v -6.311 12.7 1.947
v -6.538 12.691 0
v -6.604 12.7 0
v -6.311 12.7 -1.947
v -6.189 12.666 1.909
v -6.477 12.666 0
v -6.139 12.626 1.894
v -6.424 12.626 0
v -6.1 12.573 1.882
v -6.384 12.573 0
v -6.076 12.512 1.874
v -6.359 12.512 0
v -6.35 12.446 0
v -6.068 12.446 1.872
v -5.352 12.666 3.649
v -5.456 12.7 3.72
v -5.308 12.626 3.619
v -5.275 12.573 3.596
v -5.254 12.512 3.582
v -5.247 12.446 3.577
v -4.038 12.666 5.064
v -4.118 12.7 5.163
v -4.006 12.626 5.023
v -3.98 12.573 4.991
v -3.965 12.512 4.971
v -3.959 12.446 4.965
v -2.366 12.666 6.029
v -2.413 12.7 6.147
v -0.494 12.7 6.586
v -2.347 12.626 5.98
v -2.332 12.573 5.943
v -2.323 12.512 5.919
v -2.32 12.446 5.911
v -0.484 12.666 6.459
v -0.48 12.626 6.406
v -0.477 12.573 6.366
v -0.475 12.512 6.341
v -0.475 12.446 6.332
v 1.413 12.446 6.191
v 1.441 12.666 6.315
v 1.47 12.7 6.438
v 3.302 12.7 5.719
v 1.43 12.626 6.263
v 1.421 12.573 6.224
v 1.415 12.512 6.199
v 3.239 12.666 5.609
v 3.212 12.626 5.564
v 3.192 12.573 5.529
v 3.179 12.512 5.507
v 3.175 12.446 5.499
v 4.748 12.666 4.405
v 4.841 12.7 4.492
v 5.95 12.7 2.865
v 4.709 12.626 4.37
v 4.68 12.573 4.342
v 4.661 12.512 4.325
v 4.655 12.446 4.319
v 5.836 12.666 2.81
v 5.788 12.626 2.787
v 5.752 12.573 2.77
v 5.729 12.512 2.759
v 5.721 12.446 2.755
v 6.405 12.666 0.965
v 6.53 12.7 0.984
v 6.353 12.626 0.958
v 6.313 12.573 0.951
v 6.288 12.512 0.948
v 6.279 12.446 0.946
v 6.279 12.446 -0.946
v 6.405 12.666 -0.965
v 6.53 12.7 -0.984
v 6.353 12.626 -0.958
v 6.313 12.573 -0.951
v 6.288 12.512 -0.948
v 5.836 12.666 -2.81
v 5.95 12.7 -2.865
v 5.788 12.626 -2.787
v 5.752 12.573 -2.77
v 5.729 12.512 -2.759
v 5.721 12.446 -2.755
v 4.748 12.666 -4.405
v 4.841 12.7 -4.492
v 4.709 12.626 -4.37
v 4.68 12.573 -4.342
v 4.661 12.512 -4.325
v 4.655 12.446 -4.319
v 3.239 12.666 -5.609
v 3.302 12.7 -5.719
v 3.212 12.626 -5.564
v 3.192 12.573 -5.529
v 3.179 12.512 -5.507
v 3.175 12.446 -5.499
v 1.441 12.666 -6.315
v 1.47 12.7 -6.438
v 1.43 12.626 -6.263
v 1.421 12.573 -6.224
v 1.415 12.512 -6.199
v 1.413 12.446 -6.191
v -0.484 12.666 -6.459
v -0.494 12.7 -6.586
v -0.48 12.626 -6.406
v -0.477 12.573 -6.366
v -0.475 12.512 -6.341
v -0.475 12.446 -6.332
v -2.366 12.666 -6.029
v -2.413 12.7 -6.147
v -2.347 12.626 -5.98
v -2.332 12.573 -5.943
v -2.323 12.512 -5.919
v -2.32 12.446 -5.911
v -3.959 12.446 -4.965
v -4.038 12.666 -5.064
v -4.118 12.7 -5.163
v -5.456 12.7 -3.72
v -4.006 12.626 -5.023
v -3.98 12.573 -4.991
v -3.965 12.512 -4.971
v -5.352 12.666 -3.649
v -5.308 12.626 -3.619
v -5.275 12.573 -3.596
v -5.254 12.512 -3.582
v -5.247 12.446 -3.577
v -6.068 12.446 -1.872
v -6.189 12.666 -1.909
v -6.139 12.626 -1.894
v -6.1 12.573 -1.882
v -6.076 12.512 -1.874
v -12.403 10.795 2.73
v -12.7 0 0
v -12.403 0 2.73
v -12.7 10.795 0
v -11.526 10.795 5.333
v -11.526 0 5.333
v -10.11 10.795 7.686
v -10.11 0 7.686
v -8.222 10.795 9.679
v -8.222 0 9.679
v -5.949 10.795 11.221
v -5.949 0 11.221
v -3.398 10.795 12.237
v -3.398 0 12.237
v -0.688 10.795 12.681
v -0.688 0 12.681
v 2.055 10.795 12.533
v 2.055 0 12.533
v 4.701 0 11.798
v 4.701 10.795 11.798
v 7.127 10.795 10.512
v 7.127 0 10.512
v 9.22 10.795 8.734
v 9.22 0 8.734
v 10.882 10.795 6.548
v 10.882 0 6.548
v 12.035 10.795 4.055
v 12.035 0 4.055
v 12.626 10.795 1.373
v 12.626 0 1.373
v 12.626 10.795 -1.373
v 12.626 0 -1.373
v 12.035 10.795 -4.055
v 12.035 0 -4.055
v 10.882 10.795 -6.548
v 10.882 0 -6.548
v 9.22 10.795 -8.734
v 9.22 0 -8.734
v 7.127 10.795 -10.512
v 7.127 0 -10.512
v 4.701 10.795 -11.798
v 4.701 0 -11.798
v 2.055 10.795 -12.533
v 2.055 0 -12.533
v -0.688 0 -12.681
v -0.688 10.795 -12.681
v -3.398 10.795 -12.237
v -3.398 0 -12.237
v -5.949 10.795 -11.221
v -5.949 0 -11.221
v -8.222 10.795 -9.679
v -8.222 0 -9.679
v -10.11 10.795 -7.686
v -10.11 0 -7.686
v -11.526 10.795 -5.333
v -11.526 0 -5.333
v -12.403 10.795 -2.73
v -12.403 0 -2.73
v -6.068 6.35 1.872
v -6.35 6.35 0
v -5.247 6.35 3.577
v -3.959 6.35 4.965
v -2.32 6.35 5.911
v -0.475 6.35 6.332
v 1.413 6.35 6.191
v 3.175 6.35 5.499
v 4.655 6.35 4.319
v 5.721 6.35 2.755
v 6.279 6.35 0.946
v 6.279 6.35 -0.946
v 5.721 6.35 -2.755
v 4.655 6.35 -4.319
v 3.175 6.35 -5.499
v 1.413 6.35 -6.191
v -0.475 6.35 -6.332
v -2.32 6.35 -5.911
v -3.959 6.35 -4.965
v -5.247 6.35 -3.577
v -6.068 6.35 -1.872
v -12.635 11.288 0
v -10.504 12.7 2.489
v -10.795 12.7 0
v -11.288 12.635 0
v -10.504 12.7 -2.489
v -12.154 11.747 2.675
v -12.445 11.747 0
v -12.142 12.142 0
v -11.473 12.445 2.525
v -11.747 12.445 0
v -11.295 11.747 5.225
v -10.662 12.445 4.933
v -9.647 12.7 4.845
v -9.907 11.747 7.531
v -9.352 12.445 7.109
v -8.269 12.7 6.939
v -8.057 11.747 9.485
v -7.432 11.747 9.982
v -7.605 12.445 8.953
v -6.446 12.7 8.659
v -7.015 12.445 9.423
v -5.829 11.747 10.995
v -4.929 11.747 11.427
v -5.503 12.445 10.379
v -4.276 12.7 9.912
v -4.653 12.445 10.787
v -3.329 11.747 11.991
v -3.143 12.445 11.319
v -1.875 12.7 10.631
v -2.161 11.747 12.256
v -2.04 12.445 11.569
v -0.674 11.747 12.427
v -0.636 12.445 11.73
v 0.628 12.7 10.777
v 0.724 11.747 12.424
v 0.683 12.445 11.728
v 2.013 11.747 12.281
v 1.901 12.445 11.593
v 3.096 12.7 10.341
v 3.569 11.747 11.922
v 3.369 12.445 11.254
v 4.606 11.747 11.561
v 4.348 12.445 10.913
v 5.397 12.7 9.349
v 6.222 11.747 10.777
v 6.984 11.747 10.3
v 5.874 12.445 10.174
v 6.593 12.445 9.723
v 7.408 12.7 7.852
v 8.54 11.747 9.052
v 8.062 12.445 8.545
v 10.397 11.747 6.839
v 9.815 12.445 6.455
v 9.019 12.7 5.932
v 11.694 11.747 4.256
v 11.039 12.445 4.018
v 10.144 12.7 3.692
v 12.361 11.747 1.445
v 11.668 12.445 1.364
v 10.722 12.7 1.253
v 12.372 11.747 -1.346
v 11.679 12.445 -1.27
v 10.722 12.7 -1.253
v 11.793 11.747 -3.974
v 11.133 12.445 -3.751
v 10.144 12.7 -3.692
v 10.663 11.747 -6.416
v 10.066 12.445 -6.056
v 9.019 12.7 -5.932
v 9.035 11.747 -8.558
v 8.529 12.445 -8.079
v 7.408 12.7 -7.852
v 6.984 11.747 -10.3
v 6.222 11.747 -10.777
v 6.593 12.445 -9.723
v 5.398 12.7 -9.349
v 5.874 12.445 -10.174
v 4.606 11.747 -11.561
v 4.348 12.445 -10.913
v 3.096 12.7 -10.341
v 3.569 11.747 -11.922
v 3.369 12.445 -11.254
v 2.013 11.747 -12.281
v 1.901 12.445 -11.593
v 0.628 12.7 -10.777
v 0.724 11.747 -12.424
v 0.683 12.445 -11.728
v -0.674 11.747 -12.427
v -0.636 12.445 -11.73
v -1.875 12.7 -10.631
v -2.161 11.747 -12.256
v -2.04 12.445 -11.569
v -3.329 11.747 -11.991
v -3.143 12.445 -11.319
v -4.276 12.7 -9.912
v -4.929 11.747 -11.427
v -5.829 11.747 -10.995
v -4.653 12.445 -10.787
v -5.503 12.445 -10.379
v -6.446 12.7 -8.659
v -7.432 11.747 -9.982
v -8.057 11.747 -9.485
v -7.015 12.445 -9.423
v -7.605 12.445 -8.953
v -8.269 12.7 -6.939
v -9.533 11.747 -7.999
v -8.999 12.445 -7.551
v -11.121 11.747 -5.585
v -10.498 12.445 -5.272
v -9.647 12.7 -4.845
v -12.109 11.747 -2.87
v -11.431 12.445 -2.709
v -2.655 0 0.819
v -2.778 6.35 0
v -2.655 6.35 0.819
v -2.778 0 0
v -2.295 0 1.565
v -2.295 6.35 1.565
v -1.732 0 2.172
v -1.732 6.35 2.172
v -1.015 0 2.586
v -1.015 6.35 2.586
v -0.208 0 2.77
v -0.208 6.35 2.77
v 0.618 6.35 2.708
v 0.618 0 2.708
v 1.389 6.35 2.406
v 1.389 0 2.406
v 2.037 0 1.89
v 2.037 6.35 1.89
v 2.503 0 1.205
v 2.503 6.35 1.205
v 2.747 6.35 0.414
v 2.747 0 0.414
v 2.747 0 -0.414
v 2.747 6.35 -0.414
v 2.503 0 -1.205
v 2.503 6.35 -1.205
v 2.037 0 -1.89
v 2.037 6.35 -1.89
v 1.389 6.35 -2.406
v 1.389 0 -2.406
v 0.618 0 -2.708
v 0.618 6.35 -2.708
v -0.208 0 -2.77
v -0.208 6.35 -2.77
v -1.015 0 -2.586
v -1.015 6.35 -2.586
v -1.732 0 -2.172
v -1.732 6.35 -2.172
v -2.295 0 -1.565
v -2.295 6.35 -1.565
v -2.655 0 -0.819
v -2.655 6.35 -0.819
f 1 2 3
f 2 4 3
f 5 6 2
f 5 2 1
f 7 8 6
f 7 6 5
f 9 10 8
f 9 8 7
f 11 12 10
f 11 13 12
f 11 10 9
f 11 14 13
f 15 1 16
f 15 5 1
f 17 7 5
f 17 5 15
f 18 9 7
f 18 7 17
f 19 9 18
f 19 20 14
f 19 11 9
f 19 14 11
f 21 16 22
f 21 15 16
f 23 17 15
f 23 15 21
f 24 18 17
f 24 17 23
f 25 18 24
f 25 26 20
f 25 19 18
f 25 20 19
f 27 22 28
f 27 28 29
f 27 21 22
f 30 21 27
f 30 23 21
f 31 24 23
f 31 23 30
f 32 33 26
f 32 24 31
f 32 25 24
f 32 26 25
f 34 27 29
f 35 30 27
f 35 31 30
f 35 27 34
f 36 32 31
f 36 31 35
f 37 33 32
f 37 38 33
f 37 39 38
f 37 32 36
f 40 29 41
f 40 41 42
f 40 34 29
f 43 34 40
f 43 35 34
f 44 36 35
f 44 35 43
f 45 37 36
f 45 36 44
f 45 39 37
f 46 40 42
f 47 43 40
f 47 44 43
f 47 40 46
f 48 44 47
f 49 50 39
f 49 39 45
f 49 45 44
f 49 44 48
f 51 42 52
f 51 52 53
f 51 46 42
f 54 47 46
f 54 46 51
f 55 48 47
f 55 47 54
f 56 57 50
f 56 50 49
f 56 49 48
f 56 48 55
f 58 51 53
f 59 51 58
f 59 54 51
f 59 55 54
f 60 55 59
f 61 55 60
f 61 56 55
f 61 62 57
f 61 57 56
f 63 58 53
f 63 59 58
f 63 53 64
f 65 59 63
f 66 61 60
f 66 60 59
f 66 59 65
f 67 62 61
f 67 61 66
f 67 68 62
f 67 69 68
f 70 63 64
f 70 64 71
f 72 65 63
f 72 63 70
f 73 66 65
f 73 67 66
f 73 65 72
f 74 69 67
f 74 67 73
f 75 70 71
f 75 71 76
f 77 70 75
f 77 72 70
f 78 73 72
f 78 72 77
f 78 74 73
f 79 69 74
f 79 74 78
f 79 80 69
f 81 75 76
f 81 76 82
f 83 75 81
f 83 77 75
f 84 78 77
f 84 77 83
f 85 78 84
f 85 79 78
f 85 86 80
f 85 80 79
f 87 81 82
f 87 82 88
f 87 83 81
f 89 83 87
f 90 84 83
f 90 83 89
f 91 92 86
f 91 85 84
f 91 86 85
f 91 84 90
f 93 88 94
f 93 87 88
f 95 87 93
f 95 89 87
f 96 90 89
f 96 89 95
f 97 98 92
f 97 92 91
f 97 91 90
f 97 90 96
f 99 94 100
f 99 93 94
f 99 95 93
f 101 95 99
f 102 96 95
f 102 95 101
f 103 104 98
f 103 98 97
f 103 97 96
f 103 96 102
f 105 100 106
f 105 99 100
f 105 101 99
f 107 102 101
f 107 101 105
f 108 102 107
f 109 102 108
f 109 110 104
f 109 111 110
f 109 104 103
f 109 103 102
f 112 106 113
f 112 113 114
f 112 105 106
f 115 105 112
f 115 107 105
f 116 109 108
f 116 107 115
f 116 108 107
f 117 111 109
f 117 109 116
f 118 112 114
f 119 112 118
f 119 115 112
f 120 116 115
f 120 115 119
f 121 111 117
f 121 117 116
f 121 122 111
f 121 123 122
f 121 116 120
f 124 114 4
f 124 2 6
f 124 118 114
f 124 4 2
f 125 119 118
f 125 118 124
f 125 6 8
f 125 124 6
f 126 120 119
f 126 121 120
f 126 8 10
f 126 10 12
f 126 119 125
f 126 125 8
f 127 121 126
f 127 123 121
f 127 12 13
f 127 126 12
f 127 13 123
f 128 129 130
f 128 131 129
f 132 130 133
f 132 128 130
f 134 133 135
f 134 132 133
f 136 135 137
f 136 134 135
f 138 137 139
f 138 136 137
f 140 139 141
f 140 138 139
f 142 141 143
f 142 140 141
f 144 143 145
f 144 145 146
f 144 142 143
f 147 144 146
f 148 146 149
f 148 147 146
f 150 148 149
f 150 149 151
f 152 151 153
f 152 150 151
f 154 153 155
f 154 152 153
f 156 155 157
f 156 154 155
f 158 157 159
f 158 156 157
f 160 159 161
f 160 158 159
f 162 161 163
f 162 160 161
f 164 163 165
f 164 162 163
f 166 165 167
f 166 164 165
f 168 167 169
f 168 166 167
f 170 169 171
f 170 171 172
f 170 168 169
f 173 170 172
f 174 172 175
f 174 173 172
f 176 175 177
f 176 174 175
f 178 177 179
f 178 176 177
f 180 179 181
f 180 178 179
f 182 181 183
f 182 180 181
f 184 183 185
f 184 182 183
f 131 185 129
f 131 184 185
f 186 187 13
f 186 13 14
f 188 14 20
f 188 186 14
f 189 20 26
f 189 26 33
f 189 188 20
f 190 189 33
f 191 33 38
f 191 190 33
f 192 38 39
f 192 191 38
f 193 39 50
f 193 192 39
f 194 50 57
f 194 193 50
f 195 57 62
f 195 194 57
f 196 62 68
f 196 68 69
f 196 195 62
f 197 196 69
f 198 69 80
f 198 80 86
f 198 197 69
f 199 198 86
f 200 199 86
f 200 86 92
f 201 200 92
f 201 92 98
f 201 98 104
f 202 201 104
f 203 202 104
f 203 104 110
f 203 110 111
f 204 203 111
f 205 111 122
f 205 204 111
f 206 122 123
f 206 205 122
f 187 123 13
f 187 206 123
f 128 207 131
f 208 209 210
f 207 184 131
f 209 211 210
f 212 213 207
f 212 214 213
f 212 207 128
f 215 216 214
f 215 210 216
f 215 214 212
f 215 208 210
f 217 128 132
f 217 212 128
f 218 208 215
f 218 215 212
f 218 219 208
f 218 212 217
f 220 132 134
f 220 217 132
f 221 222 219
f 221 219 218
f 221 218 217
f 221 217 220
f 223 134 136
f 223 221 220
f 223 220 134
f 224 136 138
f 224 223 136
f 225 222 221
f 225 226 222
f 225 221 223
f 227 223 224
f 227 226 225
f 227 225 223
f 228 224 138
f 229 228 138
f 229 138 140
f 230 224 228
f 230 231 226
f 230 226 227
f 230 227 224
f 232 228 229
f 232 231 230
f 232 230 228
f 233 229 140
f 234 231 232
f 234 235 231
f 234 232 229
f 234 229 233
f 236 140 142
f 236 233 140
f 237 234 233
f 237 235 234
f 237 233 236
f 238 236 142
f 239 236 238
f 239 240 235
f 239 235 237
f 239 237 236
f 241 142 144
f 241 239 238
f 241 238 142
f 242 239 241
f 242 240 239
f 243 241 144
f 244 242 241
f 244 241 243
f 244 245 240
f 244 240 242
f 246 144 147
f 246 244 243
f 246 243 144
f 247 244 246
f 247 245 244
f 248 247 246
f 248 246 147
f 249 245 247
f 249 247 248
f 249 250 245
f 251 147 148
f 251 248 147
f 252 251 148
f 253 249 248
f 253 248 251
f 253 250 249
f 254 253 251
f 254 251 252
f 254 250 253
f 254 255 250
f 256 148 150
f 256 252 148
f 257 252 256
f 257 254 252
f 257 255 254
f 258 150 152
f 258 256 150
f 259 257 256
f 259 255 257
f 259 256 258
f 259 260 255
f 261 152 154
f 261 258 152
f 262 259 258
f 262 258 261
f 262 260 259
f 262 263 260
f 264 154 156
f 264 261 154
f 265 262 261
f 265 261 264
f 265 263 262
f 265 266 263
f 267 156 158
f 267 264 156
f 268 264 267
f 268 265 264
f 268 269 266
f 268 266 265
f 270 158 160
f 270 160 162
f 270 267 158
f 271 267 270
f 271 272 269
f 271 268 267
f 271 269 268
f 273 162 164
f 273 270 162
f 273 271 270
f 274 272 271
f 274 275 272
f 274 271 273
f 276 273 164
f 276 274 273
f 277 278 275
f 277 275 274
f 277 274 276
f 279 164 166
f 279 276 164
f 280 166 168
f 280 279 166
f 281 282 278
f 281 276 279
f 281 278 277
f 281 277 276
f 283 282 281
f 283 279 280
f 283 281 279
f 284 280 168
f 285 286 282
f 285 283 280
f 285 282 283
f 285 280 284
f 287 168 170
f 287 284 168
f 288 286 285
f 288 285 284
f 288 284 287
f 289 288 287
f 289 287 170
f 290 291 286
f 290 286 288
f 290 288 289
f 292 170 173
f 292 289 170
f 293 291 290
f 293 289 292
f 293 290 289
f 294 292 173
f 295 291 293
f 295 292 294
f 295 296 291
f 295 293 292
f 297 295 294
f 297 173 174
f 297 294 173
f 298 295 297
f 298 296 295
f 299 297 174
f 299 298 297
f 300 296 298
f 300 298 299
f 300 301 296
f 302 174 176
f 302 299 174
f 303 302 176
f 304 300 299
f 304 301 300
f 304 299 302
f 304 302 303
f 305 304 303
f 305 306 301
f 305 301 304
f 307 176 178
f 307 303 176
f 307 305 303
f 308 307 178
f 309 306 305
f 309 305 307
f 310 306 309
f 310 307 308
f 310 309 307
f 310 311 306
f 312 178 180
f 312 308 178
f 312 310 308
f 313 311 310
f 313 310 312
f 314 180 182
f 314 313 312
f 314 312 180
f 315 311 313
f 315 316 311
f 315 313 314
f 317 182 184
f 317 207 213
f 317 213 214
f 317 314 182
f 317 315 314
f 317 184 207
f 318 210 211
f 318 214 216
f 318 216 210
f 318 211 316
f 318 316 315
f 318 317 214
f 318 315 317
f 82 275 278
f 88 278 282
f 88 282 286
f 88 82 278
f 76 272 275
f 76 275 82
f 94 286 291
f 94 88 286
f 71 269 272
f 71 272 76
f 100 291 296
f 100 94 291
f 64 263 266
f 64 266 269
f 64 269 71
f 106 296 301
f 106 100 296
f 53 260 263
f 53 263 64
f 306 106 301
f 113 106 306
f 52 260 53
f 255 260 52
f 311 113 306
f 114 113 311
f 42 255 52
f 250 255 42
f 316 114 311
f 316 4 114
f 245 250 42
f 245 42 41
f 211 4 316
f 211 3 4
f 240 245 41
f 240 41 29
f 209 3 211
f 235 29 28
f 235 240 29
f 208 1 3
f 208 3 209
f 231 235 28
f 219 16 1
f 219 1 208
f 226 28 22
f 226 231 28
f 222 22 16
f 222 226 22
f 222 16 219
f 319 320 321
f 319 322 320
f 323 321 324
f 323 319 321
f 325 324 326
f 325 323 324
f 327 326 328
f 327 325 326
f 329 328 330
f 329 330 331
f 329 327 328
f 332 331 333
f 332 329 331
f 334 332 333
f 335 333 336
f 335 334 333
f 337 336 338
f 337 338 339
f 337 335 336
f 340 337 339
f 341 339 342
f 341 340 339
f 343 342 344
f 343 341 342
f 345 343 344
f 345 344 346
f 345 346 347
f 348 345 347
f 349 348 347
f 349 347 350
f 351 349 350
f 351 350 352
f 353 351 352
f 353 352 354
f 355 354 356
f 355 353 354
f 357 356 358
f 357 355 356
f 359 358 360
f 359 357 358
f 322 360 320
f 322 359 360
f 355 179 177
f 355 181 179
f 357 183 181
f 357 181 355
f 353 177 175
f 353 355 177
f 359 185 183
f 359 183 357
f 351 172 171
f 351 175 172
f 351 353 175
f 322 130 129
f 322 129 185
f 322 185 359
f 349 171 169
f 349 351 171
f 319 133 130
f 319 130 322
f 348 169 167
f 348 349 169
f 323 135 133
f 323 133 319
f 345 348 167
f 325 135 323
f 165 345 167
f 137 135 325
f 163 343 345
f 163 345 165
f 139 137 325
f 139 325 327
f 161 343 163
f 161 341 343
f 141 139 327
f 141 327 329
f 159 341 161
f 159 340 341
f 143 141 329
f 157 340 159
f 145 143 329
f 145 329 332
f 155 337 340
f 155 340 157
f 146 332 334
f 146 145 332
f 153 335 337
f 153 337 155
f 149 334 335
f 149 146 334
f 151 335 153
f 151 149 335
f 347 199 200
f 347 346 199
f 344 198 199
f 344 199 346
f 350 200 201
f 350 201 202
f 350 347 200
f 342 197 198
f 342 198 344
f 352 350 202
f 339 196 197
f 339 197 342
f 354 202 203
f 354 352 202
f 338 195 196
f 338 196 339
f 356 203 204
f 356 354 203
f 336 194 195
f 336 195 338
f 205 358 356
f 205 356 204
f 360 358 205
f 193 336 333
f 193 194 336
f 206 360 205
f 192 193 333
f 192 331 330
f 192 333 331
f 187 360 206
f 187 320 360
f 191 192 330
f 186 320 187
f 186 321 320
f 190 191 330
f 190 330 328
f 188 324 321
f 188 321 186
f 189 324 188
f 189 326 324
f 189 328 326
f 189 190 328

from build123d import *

# Parameters (mm, degrees)
FILLET1_R = 0.254


with BuildPart() as part:
    # Sketch2 → Revolve1 (revolve)
    with BuildSketch(Plane.XY):
        with BuildLine():
            Line((-12.7, 0), (-12.7, 10.795))
            ThreePointArc((-12.7, 10.795), (-12.142038418, 12.142038418), (-10.795, 12.7))
            Line((-10.795, 12.7), (-6.35, 12.7))
            Line((-6.35, 12.7), (-6.35, 6.35))
            Line((-6.35, 6.35), (-2.778125, 6.35))
            Line((-2.778125, 6.35), (-2.778125, 0))
            Line((-2.778125, 0), (-12.7, 0))
        make_face()
    revolve(axis=Axis((0, 0, 0), (0, 1, 0)))

    # Fillet1
    fillet1_edges = [part.edges().sort_by_distance(p)[0] for p in [
        (6.35, 12.7, 0),
    ]]
    fillet(fillet1_edges, radius=FILLET1_R)


solid = part.part
